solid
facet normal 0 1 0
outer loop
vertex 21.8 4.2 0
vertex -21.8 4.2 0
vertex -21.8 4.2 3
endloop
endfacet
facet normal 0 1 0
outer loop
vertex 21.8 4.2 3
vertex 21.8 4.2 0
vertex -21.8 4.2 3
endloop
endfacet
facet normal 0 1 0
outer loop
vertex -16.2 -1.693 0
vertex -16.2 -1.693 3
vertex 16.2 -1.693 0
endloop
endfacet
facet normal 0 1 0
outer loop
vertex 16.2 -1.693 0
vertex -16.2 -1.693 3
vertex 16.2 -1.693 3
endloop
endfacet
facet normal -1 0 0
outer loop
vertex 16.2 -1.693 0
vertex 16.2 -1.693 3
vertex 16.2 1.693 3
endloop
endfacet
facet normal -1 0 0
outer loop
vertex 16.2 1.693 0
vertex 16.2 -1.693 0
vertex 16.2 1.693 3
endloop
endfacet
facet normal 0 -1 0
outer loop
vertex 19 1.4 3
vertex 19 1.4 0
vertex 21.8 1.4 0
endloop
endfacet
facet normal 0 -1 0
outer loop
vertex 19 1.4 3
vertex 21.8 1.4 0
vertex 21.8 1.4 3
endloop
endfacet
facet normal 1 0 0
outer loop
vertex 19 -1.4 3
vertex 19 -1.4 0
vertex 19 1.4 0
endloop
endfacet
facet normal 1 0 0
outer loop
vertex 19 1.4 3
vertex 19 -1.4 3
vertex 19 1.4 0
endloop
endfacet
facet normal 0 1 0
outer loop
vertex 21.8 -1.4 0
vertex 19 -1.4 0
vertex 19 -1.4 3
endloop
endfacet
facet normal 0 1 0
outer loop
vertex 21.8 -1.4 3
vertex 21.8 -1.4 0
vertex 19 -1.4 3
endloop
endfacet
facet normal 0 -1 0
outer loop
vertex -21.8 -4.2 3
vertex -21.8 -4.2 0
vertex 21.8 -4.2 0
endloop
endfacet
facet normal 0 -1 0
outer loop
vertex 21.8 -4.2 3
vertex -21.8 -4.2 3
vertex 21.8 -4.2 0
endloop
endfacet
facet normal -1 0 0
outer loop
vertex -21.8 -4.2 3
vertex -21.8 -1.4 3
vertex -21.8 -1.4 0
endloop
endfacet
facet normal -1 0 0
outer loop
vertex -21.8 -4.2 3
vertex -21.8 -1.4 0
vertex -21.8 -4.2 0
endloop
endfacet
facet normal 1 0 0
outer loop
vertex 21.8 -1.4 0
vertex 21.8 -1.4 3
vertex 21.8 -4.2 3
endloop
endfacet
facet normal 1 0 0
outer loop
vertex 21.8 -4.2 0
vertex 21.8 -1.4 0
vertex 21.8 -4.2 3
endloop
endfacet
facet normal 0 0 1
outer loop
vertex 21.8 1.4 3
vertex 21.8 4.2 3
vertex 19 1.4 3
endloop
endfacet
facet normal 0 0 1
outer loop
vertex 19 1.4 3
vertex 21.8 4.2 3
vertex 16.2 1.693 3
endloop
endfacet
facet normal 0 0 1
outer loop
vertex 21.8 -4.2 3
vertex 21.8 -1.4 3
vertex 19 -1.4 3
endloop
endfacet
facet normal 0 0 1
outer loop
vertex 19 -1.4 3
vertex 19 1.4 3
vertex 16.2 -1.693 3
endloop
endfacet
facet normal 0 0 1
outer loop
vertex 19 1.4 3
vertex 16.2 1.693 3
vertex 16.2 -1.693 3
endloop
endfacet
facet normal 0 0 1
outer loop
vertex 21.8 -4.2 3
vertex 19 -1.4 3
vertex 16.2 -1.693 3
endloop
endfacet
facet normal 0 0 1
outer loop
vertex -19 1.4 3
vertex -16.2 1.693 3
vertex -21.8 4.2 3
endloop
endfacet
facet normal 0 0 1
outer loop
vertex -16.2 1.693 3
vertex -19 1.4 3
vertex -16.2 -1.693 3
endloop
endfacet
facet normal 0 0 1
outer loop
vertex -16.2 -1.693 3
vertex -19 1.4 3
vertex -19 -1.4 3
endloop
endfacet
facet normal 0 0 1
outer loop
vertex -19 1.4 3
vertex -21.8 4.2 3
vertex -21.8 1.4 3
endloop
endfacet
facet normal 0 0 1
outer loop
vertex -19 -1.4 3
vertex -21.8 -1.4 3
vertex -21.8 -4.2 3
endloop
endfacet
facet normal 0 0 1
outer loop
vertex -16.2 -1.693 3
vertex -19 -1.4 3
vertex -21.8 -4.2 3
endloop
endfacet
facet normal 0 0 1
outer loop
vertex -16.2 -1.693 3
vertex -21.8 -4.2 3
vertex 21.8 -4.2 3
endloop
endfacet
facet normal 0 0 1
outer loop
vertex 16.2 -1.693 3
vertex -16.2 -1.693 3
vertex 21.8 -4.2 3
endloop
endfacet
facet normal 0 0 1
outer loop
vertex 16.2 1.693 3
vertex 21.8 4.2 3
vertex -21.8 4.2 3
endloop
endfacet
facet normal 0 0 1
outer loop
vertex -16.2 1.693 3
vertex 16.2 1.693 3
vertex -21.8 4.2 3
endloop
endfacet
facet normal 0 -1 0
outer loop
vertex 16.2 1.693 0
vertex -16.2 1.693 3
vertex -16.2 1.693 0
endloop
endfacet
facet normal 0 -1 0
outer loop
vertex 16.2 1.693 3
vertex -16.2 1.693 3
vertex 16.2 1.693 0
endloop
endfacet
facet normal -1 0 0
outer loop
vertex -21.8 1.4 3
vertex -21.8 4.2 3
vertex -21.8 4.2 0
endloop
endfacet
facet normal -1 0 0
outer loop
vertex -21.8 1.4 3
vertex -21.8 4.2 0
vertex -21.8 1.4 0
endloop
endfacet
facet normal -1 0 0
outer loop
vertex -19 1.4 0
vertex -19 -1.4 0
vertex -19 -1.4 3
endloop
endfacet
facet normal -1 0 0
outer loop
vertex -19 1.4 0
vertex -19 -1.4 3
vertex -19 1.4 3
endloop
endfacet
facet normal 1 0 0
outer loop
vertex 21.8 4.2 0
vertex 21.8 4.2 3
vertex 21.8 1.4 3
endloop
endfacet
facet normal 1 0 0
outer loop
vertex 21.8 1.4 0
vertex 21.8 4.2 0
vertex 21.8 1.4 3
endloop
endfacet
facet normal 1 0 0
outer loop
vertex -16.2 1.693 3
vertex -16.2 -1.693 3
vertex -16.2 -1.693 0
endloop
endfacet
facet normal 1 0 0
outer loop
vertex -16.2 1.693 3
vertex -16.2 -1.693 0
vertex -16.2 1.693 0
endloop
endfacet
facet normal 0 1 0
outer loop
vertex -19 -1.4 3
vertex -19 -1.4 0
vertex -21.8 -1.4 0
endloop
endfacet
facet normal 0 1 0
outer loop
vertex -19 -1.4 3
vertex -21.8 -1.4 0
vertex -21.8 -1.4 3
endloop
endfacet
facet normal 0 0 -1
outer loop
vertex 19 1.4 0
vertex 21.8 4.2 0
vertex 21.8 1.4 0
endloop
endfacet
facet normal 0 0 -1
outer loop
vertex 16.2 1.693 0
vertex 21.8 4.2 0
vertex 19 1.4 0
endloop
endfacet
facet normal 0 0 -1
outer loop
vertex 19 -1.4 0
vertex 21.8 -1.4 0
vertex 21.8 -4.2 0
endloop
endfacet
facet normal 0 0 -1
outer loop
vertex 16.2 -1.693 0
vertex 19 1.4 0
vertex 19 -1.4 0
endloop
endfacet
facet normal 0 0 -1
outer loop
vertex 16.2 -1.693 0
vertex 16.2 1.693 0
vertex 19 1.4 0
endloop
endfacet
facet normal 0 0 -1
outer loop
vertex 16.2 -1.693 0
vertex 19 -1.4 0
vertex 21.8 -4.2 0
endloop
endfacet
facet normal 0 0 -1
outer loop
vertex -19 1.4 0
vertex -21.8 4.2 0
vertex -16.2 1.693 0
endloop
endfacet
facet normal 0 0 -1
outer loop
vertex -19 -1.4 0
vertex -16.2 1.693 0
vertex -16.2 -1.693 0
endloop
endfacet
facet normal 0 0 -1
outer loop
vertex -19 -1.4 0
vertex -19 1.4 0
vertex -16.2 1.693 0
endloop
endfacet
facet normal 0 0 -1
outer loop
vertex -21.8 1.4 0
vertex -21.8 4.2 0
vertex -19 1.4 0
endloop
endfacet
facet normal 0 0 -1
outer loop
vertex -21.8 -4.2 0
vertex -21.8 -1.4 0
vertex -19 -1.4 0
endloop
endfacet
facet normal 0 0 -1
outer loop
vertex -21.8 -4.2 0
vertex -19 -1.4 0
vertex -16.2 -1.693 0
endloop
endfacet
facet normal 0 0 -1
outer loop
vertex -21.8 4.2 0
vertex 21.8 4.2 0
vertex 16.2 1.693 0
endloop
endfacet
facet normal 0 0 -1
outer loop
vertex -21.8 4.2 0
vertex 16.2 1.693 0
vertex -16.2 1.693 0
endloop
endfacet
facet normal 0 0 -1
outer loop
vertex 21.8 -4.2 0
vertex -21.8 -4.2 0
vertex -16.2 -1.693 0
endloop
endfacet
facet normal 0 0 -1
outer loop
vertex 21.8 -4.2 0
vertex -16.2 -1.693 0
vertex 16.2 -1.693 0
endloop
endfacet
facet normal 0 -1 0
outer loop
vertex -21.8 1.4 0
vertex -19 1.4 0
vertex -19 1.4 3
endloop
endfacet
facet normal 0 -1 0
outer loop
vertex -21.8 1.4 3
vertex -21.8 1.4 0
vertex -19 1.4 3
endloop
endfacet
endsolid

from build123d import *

# Parameters (mm, degrees)
F0_W     = 38
F0_H     = 8.4
F1_DEPTH = 3
F2_W     = 2.8
F2_H     = 3
F3_DEPTH = 2.8
F4_W     = 32.4
F4_H     = 3.3850746269
F5_DEPTH = 25


# Not quite as in the source:
# - a pattern or mirror of a feature is missing from the dataset's text; its kind, count and spacing are read off the source's solid


with BuildPart() as f1:
    # F0 (on Top) → F1 (new body)
    with BuildSketch(Plane.XY):
        Rectangle(F0_W, F0_H)
    extrude(amount=F1_DEPTH)

    # F2 (on face) → F3 (join)
    with BuildSketch(Plane(origin=(-19, 0, 0), x_dir=(0, -1, 0), z_dir=(-1, 0, 0))):
        with Locations((-2.8, 1.5)):
            Rectangle(F2_W, F2_H)
        with Locations((2.8, 1.5)):
            Rectangle(F2_W, F2_H)
    f3 = extrude(amount=F3_DEPTH)

    # F3_copies: F3 across plane
    add(f3.mirror(Plane(origin=(0, 0, 0), x_dir=(0, 0, 1), z_dir=(1, 0, 0))))

    # F4 (on face) → F5 (cut)
    with BuildSketch(Plane.XY.offset(3)):
        Rectangle(F4_W, F4_H)
    extrude(amount=-F5_DEPTH, mode=Mode.SUBTRACT)


solid = f1.part
